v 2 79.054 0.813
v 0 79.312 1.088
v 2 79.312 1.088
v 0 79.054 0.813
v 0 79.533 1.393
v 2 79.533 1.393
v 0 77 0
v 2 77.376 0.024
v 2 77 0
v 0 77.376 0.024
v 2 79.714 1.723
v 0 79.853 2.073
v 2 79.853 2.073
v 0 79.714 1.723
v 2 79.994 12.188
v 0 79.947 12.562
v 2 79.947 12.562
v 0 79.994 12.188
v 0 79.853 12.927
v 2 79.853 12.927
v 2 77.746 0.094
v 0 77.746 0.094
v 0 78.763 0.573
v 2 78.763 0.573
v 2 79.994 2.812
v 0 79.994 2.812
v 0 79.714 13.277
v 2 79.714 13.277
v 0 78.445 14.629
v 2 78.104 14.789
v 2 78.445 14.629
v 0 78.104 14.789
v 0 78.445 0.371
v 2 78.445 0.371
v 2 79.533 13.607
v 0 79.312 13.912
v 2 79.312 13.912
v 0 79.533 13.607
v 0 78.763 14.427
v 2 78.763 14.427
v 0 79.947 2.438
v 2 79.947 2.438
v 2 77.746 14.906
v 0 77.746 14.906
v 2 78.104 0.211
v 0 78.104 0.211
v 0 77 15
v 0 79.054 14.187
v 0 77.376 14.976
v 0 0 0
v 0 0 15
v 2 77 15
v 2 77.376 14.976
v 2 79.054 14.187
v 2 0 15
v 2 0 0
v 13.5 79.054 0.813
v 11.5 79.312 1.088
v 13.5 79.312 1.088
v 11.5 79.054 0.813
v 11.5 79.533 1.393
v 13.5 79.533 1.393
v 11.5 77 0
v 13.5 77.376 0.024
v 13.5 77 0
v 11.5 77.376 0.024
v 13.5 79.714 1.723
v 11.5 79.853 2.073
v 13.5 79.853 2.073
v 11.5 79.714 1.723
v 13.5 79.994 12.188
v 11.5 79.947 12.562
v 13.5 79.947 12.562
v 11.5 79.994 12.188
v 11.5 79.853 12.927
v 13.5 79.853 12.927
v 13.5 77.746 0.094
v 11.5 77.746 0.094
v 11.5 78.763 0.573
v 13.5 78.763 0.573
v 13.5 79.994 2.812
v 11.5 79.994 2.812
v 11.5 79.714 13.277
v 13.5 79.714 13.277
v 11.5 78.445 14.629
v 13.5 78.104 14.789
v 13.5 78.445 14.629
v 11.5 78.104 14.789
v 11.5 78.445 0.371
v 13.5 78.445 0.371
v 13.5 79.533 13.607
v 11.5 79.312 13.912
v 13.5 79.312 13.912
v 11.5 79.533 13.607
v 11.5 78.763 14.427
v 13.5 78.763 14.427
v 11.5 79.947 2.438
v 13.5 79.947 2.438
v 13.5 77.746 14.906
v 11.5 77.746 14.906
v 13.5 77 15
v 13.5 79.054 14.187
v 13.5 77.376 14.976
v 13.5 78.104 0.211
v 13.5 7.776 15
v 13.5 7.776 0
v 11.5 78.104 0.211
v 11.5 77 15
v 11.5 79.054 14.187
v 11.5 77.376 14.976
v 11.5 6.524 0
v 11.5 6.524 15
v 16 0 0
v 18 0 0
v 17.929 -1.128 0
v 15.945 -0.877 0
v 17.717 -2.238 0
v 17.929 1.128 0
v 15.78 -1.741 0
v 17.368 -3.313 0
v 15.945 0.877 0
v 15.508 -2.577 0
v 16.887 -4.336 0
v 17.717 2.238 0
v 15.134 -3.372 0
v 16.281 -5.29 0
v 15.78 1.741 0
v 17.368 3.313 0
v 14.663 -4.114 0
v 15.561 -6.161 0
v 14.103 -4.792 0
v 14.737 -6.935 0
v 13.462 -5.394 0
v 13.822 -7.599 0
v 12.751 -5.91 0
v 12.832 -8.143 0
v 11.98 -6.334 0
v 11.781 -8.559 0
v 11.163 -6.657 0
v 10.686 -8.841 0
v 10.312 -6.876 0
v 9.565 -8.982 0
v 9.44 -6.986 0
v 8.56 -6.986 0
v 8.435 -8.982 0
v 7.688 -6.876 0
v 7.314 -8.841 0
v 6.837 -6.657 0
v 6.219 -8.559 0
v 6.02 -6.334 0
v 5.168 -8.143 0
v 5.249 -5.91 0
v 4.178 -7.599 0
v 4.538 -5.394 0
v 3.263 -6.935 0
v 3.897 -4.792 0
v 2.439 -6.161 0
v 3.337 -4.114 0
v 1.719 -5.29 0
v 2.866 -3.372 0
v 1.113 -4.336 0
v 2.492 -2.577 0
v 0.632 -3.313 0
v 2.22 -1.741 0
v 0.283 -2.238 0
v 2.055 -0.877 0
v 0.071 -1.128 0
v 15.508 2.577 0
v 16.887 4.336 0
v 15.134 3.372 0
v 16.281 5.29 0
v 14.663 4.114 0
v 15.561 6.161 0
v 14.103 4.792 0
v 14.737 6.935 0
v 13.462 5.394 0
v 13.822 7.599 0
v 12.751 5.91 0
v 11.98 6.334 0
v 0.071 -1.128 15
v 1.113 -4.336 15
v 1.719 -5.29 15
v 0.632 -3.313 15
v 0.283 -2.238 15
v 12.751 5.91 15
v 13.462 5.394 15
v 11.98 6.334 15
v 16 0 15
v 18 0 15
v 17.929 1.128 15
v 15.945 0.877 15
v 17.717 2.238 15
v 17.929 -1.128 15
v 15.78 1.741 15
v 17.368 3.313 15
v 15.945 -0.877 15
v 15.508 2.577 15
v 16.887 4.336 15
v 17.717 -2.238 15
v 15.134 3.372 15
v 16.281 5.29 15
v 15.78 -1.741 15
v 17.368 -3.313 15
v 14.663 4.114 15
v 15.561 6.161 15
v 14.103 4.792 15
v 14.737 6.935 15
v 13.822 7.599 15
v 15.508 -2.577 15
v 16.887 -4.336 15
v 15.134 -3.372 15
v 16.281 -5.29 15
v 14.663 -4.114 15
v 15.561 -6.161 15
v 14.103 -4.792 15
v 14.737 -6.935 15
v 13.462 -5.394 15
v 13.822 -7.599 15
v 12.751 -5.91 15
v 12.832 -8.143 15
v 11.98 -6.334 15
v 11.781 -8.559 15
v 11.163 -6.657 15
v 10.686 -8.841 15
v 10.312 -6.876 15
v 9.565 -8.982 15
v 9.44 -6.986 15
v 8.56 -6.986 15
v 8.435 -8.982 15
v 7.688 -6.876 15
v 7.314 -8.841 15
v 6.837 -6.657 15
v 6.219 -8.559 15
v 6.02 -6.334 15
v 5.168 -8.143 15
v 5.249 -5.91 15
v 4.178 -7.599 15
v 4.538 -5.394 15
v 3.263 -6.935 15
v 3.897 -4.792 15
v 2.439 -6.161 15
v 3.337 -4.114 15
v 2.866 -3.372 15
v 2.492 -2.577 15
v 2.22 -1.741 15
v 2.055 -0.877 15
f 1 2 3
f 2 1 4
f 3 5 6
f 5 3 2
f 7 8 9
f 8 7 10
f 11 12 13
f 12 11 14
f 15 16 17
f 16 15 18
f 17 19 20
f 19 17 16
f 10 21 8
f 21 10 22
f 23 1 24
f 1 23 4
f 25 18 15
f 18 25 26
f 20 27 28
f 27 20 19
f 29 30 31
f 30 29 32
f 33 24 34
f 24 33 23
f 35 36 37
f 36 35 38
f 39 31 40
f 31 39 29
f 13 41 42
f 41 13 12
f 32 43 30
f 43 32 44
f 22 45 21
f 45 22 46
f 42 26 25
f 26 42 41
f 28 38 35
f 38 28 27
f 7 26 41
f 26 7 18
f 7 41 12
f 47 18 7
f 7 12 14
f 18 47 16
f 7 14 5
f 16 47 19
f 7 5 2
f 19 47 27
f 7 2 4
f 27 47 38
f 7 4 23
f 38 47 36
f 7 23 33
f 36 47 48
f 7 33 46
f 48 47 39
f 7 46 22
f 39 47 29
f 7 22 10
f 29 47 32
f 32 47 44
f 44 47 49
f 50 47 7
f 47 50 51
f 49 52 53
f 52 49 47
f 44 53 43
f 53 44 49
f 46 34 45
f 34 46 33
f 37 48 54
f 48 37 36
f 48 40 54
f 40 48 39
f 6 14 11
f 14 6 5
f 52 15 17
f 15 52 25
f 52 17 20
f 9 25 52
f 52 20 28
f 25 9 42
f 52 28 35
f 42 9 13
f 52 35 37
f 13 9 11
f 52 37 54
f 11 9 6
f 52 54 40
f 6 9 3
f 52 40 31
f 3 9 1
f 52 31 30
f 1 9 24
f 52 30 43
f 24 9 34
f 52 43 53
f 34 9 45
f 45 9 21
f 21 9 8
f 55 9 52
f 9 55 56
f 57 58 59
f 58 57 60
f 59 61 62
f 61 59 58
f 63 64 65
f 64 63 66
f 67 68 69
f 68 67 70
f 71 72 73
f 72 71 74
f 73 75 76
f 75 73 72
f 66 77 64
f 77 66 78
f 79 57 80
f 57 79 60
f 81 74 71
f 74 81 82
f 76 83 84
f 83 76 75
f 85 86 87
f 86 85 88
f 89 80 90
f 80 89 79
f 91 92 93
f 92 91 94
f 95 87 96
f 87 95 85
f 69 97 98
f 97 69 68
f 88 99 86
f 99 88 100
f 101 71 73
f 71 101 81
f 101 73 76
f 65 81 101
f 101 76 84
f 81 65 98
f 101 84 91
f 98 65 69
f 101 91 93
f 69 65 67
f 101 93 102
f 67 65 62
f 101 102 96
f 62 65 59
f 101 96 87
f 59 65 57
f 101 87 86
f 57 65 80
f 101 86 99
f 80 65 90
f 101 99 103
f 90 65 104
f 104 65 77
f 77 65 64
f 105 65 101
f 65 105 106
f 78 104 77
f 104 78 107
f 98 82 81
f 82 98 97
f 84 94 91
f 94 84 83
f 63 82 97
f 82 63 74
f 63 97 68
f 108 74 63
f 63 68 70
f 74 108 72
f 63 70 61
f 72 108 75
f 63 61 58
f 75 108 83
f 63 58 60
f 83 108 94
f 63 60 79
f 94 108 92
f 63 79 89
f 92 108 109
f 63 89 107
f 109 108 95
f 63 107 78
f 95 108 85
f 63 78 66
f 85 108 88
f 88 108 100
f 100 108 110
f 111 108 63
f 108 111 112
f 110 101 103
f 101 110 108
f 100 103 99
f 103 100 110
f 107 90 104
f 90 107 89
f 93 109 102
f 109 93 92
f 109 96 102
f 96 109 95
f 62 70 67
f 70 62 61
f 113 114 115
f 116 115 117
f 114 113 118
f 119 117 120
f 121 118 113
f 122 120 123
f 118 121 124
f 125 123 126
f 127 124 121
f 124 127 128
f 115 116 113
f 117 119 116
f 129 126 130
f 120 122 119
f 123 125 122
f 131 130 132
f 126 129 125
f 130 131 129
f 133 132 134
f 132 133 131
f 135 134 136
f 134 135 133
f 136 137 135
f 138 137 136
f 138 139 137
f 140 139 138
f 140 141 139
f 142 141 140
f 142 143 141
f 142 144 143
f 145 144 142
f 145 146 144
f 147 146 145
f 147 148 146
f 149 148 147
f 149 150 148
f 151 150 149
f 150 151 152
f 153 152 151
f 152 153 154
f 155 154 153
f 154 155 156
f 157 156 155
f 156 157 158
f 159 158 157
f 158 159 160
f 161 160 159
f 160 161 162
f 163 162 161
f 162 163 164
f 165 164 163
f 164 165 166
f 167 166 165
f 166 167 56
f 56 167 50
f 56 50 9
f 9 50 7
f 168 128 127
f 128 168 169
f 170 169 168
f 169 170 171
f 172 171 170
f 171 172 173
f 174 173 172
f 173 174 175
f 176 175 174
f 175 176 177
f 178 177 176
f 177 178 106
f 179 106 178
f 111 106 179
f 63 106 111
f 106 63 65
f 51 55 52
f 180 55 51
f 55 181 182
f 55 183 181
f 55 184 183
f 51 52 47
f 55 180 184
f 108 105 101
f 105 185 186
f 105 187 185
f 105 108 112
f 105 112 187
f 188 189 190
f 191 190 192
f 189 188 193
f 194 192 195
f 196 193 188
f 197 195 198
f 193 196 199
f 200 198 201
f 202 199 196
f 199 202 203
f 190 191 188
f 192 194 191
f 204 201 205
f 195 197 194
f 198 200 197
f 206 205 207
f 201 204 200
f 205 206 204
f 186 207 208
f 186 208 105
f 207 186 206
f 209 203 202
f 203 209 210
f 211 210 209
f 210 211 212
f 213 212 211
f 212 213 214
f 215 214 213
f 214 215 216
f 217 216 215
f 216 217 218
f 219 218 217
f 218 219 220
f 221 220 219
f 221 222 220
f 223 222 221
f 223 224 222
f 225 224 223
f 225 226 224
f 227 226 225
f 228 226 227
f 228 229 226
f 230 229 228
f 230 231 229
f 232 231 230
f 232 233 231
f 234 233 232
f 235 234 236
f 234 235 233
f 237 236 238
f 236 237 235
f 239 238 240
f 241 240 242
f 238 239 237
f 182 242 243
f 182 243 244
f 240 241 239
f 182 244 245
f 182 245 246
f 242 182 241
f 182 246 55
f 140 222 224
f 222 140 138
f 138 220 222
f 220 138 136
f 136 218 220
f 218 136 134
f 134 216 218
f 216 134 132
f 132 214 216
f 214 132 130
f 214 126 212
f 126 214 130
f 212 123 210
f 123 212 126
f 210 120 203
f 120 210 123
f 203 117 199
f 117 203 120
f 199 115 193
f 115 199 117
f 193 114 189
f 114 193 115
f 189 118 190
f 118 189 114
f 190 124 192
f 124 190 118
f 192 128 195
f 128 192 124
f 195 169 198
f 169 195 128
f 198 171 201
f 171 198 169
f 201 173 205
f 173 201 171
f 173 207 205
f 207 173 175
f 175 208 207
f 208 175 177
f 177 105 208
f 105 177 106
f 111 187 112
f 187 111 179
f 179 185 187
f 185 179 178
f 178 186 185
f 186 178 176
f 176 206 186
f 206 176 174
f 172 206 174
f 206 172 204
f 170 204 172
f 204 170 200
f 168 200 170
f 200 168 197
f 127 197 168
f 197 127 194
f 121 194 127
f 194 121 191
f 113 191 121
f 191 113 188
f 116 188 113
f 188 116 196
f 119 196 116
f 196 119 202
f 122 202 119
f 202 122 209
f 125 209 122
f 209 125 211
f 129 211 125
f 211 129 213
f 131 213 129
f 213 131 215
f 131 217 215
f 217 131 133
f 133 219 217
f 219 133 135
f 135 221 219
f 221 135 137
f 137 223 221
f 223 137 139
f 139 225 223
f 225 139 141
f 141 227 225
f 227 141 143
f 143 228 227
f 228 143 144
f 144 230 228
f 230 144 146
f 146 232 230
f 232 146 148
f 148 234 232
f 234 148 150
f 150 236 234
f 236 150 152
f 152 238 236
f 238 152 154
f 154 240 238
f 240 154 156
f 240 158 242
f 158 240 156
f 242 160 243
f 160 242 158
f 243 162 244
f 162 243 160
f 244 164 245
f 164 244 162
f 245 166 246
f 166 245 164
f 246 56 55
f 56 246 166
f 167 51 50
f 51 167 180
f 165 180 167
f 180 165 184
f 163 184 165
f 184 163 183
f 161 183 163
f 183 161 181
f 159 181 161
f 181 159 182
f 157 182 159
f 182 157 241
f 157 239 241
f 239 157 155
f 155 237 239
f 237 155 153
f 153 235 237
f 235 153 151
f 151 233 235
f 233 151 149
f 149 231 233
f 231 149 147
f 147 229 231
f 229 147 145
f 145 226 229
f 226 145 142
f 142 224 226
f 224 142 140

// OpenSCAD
$fn=50;
wallThck=2;
clipThck=9.5;
ovDims=[15,18,80]; //height is clipped height
crnrRad=3;

/* [hidden] */
fudge=0.1;
rad=ovDims.y/2-wallThck;

linear_extrude(ovDims.x) clip();

for (ix=[0,1])
  translate([ix*(wallThck+clipThck),ovDims.z-crnrRad,0]) 
    hull() for (iz=[crnrRad,ovDims.x-crnrRad]) translate([0,0,,iz]) 
      rotate([0,90,0]) cylinder(r=crnrRad,h=wallThck);

module clip(){
  
  difference(){
    union(){
      translate([rad+wallThck,0]) circle(rad+wallThck);
      square([wallThck*2+clipThck,ovDims.z-crnrRad]);
    }
    translate([rad+wallThck,0]) circle(rad);
    translate([wallThck,0]) square([clipThck,ovDims.z-crnrRad+fudge]);
  }
}
